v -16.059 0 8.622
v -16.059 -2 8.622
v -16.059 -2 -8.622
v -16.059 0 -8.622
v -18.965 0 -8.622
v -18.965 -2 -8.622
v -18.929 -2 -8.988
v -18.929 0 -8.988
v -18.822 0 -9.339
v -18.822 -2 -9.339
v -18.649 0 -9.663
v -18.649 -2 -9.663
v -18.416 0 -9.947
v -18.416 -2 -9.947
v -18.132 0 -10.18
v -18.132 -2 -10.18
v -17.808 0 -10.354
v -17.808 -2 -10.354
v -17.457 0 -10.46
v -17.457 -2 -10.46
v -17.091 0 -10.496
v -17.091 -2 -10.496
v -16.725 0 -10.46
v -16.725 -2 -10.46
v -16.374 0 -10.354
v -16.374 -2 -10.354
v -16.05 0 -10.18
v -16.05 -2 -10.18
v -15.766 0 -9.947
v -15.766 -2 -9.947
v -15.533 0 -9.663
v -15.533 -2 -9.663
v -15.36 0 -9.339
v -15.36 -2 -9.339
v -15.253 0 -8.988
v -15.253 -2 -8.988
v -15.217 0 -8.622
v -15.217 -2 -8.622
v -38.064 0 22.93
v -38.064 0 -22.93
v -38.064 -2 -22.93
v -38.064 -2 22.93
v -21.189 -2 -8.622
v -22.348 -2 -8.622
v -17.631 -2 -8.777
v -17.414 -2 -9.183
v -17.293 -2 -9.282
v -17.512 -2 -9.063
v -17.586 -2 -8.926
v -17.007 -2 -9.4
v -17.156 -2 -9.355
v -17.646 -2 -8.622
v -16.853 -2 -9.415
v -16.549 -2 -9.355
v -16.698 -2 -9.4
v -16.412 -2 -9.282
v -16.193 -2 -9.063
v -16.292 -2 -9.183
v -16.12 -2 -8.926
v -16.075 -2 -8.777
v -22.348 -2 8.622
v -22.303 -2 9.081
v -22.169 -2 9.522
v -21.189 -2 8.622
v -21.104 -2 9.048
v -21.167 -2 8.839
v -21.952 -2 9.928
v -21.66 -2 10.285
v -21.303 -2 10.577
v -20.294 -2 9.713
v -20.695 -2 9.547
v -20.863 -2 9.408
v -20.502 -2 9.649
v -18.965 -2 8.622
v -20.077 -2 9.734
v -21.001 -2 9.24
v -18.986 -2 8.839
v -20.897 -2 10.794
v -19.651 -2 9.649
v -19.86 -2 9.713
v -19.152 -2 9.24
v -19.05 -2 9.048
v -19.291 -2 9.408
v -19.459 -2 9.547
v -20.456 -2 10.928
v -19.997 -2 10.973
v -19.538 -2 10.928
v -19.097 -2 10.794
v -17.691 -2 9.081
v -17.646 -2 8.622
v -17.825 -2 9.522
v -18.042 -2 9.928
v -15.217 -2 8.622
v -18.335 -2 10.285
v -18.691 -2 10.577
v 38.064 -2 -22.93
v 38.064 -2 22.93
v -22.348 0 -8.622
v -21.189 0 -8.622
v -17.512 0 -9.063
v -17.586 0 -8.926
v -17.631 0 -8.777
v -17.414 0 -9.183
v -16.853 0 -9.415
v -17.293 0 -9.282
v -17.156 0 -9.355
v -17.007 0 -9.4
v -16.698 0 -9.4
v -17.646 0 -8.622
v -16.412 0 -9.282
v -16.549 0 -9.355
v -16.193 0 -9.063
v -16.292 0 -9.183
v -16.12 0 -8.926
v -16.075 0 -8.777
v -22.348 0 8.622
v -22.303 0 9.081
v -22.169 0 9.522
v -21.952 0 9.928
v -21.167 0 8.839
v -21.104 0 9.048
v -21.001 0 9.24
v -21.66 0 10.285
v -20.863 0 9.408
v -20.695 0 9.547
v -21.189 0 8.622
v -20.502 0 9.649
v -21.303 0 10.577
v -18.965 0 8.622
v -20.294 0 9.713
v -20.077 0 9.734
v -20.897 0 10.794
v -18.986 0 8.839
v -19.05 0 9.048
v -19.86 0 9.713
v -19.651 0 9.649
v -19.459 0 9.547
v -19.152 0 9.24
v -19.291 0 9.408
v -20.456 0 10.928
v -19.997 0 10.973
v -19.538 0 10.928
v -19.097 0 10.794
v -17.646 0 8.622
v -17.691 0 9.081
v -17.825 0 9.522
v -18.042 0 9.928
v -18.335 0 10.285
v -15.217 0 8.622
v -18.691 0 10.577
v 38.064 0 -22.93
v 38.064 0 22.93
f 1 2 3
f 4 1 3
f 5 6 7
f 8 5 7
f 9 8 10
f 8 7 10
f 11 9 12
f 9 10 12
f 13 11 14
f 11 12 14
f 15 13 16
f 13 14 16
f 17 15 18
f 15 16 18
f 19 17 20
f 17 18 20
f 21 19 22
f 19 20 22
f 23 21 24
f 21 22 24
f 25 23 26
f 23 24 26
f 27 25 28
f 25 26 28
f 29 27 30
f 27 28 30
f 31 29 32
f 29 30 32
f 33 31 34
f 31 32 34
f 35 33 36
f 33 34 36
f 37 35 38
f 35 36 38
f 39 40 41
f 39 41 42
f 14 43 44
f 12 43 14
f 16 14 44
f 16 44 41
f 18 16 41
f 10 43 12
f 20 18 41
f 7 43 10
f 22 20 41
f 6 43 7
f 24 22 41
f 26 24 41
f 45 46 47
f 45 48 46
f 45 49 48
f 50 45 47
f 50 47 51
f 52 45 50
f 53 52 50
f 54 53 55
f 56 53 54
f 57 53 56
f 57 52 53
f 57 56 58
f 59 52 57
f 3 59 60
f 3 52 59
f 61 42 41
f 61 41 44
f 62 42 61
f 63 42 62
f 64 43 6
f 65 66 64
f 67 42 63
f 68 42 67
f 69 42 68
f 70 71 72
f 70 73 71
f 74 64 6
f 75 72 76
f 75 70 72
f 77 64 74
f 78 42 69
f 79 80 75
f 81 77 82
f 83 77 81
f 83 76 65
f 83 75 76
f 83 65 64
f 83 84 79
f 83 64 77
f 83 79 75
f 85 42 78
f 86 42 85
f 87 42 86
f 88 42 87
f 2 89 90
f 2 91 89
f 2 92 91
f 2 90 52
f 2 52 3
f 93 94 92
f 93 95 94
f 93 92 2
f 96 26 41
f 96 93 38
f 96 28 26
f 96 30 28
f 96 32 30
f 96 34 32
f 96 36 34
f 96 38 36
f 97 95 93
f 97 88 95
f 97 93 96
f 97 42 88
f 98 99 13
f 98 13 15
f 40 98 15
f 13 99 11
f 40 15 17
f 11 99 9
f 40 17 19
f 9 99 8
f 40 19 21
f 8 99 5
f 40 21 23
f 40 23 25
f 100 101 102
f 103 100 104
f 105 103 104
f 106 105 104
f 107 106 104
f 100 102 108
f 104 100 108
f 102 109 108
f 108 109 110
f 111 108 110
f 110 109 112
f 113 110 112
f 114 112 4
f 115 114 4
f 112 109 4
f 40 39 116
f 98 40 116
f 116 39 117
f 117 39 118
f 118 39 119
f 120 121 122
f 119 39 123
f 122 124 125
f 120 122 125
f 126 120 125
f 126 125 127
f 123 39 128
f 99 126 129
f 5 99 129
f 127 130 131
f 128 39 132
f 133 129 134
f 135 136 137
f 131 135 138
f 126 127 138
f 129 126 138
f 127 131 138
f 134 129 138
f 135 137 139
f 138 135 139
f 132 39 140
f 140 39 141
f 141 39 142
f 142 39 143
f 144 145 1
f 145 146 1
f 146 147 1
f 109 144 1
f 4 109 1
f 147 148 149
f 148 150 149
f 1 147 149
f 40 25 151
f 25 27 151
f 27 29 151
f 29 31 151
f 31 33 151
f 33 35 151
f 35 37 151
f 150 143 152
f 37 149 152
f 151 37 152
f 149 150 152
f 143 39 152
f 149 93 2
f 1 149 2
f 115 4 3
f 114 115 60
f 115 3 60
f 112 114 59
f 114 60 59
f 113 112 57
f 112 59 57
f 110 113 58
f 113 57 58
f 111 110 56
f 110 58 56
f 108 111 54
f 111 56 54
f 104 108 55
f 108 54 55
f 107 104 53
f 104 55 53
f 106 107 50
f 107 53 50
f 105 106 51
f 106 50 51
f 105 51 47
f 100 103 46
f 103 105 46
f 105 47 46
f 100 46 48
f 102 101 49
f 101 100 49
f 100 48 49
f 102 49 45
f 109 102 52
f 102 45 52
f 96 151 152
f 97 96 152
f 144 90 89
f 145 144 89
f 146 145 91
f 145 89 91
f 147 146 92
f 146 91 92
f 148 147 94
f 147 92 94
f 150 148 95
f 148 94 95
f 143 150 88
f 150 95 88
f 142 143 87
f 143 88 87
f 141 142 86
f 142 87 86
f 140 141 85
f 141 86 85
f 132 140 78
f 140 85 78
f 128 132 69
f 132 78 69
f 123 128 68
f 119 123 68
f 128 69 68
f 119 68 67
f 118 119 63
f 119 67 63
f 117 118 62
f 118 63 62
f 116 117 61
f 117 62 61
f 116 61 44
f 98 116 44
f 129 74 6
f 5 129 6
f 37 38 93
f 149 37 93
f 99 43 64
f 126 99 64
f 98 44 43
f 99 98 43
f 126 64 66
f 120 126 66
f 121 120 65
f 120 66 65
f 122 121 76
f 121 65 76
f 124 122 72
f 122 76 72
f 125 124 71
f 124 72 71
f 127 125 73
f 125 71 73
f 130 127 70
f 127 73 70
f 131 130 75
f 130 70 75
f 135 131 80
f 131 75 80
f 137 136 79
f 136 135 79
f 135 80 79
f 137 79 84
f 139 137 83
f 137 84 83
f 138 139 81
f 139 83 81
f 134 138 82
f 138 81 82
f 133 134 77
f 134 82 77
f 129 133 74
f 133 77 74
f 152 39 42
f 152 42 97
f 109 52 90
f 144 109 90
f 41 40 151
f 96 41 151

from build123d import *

# Parameters (mm, degrees)
F0_W     = 76.127068
F0_H     = 45.85968
F1_DEPTH = 2
F3_DEPTH = 2.001


with BuildPart() as f1:
    # F0 (on Front) → F1 (new body)
    with BuildSketch(Plane.XZ):
        Rectangle(F0_W, F0_H)
    extrude(amount=F1_DEPTH)

    # F2 (on face) → F3 (cut, through all)
    with BuildSketch(Plane.XZ.offset(2)):
        with BuildLine():
            Line((-22.34818, -8.622167), (-21.188844, -8.622167))
            Line((-21.188844, -8.622167), (-21.188844, 8.622167))
            ThreePointArc((-21.188844, 8.622167), (-20.0769, 9.734111), (-18.964956, 8.622167))
            Line((-18.964956, 8.622167), (-18.964956, -8.622167))
            ThreePointArc((-18.964956, -8.622167), (-17.090918, -10.496205), (-15.21688, -8.622167))
            Line((-15.21688, -8.622167), (-15.21688, 8.622167))
            Line((-15.21688, 8.622167), (-16.059408, 8.622167))
            Line((-16.059408, 8.622167), (-16.059408, -8.622167))
            ThreePointArc((-16.059408, -8.622167), (-16.852695, -9.415454), (-17.645983, -8.622167))
            Line((-17.645983, -8.622167), (-17.645983, 8.622167))
            ThreePointArc((-17.645983, 8.622167), (-19.997082, 10.973265), (-22.34818, 8.622167))
            Line((-22.34818, 8.622167), (-22.34818, -8.622167))
        make_face()
    extrude(amount=-F3_DEPTH, mode=Mode.SUBTRACT)


solid = f1.part
